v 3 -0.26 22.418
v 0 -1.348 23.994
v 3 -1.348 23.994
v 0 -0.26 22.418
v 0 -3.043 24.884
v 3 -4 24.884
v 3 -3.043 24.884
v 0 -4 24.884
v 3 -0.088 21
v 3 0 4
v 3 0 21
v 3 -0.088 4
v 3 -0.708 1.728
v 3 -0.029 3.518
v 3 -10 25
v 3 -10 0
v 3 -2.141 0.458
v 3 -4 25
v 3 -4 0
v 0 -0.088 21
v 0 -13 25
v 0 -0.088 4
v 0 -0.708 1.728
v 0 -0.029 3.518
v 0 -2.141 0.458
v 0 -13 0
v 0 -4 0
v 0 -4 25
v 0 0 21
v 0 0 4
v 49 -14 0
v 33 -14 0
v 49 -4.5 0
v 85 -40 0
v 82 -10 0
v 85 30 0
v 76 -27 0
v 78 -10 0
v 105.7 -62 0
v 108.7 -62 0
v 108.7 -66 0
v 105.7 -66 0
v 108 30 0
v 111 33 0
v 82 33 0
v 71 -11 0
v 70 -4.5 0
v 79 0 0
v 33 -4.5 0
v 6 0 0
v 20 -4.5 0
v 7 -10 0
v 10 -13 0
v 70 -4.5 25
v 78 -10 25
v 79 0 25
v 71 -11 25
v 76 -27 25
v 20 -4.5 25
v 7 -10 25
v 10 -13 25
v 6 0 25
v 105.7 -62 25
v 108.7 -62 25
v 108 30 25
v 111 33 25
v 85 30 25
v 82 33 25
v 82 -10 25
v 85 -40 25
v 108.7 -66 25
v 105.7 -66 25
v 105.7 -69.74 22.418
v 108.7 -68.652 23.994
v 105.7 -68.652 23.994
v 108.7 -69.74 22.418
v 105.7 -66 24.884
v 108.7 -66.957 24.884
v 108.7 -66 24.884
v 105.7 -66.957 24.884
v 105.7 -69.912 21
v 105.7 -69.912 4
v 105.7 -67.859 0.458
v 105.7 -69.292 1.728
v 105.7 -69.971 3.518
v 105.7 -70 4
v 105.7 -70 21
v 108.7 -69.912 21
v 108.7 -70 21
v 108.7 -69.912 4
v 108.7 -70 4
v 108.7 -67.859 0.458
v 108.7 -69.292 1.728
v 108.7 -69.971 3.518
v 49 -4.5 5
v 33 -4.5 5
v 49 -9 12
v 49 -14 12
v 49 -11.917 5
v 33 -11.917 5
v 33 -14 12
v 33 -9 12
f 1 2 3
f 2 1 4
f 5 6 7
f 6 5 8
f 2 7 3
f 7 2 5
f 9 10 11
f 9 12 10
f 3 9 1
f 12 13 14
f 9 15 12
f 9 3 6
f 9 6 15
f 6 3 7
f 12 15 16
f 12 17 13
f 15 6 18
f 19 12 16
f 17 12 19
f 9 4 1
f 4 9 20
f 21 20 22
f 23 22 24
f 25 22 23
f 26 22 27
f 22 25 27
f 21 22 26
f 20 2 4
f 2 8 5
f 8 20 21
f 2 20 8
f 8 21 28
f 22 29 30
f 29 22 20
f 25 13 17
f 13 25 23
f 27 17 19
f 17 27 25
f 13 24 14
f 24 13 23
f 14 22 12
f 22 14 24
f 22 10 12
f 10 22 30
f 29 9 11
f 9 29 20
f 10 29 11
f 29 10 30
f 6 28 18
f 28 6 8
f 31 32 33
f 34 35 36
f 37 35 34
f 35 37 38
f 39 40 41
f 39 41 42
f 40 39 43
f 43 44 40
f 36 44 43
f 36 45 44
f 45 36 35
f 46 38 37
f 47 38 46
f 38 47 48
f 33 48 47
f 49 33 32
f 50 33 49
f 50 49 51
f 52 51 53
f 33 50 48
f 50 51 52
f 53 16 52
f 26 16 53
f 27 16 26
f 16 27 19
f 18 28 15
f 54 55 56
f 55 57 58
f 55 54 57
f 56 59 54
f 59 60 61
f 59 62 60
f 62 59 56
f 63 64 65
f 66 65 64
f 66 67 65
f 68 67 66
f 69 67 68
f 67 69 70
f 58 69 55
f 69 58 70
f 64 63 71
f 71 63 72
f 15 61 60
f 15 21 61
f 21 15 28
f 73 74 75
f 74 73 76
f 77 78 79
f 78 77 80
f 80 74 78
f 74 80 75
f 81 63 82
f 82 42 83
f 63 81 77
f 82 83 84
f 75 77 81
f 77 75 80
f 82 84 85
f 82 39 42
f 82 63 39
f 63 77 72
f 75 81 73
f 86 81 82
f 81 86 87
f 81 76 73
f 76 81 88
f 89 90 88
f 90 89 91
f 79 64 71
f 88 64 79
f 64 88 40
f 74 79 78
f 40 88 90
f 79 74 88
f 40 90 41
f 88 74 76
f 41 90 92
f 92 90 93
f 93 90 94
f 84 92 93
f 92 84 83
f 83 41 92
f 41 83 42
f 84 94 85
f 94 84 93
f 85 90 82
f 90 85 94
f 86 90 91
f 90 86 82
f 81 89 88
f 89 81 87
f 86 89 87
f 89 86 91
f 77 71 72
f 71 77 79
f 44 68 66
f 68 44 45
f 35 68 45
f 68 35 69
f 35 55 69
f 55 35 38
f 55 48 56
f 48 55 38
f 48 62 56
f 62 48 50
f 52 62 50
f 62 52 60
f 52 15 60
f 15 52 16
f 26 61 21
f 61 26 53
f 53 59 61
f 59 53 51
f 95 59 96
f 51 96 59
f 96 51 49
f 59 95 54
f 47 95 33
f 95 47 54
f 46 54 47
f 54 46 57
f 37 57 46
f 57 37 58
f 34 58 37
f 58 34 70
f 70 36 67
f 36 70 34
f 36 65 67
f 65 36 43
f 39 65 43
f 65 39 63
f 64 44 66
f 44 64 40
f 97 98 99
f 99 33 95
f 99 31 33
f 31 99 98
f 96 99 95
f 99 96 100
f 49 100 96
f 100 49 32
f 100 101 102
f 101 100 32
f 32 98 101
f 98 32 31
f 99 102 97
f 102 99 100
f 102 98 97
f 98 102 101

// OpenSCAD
/* test 14/02/2019 imprimer a 0,3, 40% infill  */

// All values are in mm
door_thickness = 23;
hanger_width = 25;//[10:40]
hanger_thickness = 3*1;
part_side = 0;//[1:left, 0:right]

// from https://wiki.phormix.com/pub/index.php?title=OpenSCAD_Modules  
module beveled_rect_top(w,d,h,r){
    union() {
        translate([r,d-r,h/2]) cylinder(r = r, h = h, center = true);
        translate([w-r,d-r,h/2]) cylinder(r = r, h = h, center = true);
        translate([r,d-r, 0]) cube([w-(r*2),r,h]);
        translate([0, 0, 0]) cube([w,d-r,h]);
    }
}

color ("red") translate([part_side?85+door_thickness+hanger_thickness:0,0,part_side?hanger_width:0]) rotate([0,part_side?180:0,0]) 
linear_extrude (height=hanger_width)
polygon(points=[[0,-8],[0,-13],
		[10,-13],[20,-hanger_thickness*1.5],[70,-hanger_thickness*1.5],
		[71,-11], [76,-27],[85,-40], [85,30], [85+door_thickness,30], [85+0.90*door_thickness,-62],
        [85+0.90*door_thickness+hanger_thickness,-62], [85+door_thickness+hanger_thickness, 30 +hanger_thickness],
        [85-hanger_thickness, 30 + hanger_thickness], [85-hanger_thickness,-10], [78, -10], [79,0], [6,0], [7,-10], 
        [hanger_thickness, -13+hanger_thickness], [hanger_thickness, -8]]);
        
translate([part_side?59:33,-14,0]) cube([16,14,5], false);
color("blue") translate([part_side?75:49,-14,12]) 
    rotate([0,180,0]) polyhedron(
        points=[[0,0,12], [16,0,12], [16,0,0], [0,0,0], [0,5,0], [16,5,0]],
        faces=[[0,1,2,3],[5,4,3,2],[0,4,5,1],[0,3,4],[5,2,1]]
    );
               
translate([part_side?85+door_thickness:0,-8,hanger_width]) rotate ([0,90,0]) beveled_rect_top(hanger_width,8, hanger_thickness, 4);
translate([part_side?0.1*door_thickness+hanger_thickness:85+0.9*door_thickness+hanger_thickness,-62,hanger_width]) rotate ([180,90,0]) beveled_rect_top(hanger_width,8, hanger_thickness, 4);
